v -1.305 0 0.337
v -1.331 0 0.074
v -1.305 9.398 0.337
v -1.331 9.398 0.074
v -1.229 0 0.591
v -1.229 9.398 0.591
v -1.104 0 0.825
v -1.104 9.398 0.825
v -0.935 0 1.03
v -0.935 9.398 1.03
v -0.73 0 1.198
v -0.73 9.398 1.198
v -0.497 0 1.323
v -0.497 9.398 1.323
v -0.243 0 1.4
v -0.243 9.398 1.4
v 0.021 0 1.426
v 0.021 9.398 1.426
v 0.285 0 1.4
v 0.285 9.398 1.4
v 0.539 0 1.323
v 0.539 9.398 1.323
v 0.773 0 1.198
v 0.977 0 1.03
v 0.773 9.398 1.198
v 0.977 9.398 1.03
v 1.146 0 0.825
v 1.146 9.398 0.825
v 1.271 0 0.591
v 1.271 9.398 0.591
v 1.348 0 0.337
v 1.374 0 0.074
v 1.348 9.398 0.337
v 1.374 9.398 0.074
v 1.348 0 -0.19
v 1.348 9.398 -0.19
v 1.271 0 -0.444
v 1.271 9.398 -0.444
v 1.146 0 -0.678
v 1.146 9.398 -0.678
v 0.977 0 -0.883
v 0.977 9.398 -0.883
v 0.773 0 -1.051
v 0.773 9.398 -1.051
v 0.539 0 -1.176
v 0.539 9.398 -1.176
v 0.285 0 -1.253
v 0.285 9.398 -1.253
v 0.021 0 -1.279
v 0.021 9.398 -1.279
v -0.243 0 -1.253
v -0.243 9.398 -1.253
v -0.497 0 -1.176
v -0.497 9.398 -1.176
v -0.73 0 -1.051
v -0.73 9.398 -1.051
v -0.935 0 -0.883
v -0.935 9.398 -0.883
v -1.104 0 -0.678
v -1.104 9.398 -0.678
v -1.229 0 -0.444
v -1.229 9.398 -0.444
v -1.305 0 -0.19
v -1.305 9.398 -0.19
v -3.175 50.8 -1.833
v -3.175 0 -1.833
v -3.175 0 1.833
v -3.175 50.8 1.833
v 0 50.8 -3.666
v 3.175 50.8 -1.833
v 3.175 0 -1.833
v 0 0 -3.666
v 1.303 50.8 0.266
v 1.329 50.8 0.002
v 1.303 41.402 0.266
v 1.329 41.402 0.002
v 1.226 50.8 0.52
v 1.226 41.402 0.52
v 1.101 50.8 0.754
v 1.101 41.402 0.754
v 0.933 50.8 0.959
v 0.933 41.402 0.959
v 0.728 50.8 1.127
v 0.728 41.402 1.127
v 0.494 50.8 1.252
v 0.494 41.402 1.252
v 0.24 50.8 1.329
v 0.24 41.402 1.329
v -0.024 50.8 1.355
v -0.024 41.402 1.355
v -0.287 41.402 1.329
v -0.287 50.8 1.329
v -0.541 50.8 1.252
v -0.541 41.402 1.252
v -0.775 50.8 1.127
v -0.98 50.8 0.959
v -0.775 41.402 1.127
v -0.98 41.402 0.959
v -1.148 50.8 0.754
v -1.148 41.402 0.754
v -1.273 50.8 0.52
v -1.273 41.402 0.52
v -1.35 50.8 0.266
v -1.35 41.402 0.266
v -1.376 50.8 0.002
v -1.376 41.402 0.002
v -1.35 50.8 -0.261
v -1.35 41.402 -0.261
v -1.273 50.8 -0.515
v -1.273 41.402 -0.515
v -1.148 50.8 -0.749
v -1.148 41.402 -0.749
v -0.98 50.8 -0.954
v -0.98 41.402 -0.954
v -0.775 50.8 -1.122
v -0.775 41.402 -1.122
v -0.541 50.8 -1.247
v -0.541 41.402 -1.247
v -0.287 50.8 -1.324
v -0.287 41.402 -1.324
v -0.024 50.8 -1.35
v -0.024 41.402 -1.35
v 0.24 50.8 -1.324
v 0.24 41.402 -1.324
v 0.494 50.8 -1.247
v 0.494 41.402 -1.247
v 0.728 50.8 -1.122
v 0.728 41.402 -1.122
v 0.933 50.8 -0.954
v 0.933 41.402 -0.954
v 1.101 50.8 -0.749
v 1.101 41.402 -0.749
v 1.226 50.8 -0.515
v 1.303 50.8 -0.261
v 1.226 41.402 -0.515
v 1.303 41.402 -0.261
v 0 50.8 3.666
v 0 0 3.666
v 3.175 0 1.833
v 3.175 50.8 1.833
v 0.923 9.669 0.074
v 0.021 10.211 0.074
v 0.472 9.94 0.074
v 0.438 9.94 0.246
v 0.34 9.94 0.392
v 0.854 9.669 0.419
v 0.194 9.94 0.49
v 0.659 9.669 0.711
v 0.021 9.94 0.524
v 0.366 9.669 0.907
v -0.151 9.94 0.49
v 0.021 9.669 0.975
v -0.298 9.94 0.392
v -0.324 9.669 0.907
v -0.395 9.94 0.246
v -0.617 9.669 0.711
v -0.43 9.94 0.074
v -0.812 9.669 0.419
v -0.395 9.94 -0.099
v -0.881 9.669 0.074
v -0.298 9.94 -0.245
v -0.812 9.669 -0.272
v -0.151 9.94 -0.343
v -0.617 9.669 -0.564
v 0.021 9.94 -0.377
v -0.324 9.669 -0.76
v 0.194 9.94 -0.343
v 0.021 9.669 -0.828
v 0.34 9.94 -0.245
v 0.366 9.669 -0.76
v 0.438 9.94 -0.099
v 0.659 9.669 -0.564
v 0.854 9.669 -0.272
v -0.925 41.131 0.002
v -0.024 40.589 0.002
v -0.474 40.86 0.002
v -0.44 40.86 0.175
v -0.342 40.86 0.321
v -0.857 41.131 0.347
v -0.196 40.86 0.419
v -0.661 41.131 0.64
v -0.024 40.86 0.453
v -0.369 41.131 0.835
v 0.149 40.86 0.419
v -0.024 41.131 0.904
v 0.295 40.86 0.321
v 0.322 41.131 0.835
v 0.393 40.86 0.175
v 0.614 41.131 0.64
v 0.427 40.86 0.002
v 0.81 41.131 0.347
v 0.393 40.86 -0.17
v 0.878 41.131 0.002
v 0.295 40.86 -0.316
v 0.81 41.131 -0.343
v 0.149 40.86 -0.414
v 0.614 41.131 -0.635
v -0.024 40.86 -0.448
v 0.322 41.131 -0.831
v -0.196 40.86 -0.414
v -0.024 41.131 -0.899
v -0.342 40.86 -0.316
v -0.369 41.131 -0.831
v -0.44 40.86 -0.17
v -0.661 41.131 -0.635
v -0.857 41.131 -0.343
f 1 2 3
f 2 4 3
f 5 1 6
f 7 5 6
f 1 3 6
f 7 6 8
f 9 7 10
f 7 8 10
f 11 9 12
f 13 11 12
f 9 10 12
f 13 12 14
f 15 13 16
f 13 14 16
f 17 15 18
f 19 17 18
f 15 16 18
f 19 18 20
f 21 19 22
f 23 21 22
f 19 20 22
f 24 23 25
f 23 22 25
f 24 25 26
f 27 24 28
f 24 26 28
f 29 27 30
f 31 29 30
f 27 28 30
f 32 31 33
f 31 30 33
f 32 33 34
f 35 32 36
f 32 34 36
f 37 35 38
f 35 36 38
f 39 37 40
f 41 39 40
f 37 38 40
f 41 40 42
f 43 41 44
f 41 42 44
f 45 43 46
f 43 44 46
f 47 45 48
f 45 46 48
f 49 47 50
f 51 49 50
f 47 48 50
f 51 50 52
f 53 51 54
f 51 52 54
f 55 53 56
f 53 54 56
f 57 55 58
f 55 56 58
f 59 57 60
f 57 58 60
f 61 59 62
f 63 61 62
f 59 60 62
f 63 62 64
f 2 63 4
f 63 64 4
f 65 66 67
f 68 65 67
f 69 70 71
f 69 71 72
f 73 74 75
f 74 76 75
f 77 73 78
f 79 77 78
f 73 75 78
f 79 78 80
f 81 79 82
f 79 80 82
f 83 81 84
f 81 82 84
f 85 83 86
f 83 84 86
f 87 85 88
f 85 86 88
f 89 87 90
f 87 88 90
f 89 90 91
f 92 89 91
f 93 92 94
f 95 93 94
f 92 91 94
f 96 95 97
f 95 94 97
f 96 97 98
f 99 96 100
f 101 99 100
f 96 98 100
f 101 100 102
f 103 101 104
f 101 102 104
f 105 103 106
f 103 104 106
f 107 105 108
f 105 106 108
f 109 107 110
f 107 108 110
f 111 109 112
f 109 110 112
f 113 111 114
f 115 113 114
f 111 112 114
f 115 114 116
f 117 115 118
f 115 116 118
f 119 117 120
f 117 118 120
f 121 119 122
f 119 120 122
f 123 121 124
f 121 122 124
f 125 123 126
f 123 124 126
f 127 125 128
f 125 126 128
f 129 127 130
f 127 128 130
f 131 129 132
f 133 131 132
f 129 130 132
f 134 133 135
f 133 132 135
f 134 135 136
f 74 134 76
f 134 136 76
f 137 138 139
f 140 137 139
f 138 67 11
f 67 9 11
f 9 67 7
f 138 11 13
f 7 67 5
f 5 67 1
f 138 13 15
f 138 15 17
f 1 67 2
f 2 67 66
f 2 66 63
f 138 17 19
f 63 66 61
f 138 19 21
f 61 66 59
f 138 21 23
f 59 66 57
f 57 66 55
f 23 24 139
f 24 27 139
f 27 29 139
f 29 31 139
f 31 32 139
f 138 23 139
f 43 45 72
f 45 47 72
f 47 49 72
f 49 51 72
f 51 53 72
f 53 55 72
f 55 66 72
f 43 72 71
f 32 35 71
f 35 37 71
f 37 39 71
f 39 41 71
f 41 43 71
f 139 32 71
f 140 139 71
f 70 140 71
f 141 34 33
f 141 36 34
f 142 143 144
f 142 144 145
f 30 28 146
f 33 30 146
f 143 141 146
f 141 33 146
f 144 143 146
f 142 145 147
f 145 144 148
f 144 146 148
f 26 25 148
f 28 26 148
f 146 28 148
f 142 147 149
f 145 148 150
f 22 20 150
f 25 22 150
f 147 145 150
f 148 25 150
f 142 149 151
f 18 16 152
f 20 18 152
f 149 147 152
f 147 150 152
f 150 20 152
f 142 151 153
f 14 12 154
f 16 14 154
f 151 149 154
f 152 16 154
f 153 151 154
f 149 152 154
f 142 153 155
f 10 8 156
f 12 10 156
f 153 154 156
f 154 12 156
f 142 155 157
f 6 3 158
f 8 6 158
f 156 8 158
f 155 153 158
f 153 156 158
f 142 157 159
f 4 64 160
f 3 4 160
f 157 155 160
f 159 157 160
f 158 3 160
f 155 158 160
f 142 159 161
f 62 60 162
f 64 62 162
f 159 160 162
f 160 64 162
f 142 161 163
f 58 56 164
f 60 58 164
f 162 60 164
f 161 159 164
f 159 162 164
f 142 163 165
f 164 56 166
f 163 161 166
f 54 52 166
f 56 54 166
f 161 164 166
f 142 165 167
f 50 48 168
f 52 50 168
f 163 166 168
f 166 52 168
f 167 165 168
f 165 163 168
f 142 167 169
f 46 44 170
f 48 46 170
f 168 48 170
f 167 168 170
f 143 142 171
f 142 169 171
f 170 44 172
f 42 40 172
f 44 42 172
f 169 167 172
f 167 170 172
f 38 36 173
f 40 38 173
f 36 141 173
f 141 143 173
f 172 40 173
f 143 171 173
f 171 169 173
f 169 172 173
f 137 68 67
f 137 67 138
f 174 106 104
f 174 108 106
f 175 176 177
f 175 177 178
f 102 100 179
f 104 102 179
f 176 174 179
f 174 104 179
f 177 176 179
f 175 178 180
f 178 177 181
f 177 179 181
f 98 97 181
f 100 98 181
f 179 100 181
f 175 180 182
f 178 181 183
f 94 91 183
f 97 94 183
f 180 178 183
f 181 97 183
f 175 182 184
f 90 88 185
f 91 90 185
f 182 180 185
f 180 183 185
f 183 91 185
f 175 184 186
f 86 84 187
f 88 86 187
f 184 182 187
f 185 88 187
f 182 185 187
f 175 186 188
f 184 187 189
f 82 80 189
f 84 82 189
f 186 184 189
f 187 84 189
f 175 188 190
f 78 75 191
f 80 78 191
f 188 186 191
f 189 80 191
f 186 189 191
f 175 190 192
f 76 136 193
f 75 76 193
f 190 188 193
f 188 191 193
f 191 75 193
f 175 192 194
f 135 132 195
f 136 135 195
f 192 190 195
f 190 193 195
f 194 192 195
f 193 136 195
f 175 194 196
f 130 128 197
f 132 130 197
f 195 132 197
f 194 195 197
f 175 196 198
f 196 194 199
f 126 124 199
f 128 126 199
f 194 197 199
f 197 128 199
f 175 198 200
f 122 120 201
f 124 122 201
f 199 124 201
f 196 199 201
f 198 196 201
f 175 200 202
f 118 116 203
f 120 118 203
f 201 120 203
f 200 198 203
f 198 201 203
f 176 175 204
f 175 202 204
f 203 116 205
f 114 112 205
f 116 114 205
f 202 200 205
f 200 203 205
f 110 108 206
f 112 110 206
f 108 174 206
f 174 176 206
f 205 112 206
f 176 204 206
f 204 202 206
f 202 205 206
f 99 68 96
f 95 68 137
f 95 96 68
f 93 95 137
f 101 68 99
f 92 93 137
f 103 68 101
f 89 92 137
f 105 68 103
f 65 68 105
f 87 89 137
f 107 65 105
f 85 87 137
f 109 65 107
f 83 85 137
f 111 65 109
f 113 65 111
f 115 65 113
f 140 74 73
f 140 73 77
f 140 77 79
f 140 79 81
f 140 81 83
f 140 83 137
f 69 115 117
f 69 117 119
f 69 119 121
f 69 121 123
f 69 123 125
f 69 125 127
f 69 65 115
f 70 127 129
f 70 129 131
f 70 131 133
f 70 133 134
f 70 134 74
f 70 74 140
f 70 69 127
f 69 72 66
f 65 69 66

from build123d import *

# Parameters (mm, degrees)
BOSS_EXTRUDE1_DEPTH       = 50.8
F_6_32_TAPPED_HOLE1_D     = 2.7051
F_6_32_TAPPED_HOLE1_DEPTH = 9.398
F_6_32_TAPPED_HOLE1_TIP   = 0.81269403
F_6_32_TAPPED_HOLE2_D     = 2.7051
F_6_32_TAPPED_HOLE2_DEPTH = 9.398
F_6_32_TAPPED_HOLE2_TIP   = 0.81269403


with BuildPart() as part:
    # Sketch1 → Boss-Extrude1 (new body)
    with BuildSketch(Plane(origin=(0, 0, 0), x_dir=(1, 0, 0), z_dir=(0, 1, 0))):
        Polygon((3.175, 1.833087105), (0, 3.666174209), (-3.175, 1.833087105), (-3.175, -1.833087105), (0, -3.666174209), (3.175, -1.833087105), align=None)
    extrude(amount=BOSS_EXTRUDE1_DEPTH)

    # #6-32 Tapped Hole1
    with Locations(Plane(origin=(0, 50.8, 0), x_dir=(-1, 0, 0), z_dir=(0, 1, 0))):
        with Locations((0.023544291, 0.002414528)):
            Hole(F_6_32_TAPPED_HOLE1_D / 2, depth=F_6_32_TAPPED_HOLE1_DEPTH)
            with Locations((0, 0, -(F_6_32_TAPPED_HOLE1_DEPTH + F_6_32_TAPPED_HOLE1_TIP / 2))):  # 118° drill point
                Cone(0, F_6_32_TAPPED_HOLE1_D / 2, F_6_32_TAPPED_HOLE1_TIP, mode=Mode.SUBTRACT)

    # #6-32 Tapped Hole2
    with Locations(Plane.XZ):
        with Locations((0.021072049, 0.073538109)):
            Hole(F_6_32_TAPPED_HOLE2_D / 2, depth=F_6_32_TAPPED_HOLE2_DEPTH)
            with Locations((0, 0, -(F_6_32_TAPPED_HOLE2_DEPTH + F_6_32_TAPPED_HOLE2_TIP / 2))):  # 118° drill point
                Cone(0, F_6_32_TAPPED_HOLE2_D / 2, F_6_32_TAPPED_HOLE2_TIP, mode=Mode.SUBTRACT)


solid = part.part
